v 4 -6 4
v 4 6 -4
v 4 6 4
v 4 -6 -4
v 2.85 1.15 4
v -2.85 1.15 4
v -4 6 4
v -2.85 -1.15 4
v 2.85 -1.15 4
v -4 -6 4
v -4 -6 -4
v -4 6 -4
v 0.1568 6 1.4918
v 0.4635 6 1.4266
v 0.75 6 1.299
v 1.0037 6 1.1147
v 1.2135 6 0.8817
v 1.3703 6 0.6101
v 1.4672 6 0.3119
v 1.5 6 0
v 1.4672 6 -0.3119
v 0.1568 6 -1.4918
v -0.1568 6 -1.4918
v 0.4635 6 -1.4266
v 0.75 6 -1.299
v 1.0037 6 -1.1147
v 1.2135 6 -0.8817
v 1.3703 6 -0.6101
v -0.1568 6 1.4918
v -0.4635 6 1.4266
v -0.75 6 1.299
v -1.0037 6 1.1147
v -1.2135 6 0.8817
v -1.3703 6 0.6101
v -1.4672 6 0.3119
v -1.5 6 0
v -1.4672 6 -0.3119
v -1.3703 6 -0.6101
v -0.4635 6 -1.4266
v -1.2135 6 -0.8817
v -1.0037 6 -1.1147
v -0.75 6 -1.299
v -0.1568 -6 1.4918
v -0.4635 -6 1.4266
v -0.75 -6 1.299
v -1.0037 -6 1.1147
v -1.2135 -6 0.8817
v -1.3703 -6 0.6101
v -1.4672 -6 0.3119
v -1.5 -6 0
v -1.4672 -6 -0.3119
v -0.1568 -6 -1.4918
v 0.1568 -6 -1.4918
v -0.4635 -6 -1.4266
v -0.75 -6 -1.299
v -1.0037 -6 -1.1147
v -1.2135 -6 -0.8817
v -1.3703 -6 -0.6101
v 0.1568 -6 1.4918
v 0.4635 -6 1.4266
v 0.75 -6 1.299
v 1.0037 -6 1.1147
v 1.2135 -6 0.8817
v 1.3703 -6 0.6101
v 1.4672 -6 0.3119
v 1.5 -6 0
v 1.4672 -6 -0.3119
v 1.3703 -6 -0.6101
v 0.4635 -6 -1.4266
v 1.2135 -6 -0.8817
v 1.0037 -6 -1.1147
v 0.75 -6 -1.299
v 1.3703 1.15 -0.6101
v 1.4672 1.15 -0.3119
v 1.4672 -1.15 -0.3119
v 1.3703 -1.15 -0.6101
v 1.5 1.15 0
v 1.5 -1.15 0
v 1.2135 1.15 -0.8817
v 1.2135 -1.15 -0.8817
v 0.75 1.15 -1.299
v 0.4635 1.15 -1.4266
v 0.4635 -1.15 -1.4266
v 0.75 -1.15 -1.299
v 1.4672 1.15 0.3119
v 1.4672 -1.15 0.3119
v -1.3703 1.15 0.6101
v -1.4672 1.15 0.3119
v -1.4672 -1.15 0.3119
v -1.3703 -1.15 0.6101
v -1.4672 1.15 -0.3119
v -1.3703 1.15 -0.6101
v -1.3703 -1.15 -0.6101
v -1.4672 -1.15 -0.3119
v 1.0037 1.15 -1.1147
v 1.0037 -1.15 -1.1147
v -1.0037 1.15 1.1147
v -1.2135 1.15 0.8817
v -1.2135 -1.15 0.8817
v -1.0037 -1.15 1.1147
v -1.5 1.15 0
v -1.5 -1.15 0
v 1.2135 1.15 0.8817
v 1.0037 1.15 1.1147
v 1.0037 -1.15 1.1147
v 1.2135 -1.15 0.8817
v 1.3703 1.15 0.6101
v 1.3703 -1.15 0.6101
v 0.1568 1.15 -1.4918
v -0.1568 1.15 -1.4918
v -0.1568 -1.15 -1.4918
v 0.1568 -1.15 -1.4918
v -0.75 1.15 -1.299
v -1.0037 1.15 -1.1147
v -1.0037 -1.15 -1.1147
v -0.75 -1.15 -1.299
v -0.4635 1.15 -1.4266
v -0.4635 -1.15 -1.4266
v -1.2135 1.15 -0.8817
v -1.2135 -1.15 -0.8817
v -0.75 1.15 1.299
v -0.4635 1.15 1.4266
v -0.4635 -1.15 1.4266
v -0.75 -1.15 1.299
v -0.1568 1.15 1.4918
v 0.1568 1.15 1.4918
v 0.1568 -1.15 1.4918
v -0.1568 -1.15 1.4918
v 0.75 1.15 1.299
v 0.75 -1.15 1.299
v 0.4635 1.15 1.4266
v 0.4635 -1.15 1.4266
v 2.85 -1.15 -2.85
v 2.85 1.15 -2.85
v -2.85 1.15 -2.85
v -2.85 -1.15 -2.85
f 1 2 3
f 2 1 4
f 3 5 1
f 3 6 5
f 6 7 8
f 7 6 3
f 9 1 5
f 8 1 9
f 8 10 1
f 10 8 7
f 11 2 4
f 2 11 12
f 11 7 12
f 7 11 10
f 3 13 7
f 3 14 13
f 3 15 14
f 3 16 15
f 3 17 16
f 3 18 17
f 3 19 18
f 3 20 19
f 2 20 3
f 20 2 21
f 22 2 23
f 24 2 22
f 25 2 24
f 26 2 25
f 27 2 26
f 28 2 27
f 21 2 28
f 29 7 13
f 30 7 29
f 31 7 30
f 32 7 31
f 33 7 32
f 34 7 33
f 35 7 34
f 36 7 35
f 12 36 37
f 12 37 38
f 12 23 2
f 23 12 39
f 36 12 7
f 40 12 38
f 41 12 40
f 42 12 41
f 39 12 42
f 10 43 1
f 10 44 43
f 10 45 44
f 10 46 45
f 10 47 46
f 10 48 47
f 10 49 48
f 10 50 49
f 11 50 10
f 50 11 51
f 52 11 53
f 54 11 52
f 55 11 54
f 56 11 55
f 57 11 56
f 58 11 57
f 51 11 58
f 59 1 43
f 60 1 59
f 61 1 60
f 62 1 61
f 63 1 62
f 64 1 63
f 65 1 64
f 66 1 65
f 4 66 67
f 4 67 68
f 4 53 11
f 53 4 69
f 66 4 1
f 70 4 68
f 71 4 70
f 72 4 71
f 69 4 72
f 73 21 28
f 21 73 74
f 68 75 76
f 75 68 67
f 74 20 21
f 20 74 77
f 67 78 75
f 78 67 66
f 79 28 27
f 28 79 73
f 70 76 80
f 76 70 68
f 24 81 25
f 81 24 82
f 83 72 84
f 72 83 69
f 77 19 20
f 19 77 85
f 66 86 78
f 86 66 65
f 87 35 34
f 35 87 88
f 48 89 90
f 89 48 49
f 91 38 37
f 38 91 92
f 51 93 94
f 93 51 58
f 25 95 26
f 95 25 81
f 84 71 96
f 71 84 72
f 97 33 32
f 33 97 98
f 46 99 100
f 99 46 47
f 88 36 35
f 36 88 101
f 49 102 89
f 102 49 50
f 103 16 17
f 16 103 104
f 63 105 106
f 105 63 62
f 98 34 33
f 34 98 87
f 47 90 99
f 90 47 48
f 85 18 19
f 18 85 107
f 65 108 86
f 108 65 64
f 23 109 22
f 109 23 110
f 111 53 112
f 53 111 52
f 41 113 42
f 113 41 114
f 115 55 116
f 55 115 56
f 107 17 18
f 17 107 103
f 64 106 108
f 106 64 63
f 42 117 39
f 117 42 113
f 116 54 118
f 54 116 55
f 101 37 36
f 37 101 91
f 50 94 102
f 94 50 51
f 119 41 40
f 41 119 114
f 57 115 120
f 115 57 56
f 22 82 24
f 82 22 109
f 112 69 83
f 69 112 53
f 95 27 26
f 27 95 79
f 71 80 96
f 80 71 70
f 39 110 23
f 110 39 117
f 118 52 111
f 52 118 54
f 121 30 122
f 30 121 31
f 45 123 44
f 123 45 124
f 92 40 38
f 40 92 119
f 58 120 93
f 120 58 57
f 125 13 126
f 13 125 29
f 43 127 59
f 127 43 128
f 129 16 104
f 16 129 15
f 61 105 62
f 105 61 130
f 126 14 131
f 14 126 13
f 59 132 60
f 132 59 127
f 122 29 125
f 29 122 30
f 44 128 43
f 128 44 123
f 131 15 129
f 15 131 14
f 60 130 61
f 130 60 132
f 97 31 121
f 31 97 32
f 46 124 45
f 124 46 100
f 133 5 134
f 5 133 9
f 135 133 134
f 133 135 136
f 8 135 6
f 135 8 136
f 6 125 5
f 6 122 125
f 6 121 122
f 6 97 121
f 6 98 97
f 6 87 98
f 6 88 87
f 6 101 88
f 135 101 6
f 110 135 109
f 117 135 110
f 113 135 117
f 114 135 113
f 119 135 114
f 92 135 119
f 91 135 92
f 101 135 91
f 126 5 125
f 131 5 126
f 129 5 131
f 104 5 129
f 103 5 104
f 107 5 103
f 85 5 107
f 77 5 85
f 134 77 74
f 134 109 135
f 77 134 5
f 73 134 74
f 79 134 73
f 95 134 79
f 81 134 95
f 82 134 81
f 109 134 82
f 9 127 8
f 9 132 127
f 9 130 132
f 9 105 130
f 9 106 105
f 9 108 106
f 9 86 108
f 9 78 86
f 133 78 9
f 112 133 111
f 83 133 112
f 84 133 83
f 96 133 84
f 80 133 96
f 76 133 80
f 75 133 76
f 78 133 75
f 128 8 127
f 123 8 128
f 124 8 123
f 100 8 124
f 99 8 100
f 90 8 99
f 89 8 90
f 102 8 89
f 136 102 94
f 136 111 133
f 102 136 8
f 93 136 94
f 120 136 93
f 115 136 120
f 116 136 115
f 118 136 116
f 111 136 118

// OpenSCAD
//powerbank

module roundedcube_simple(size = [1, 1, 1], center = false, radius = 0.5) {
	// If single value, convert to [x, y, z] vector
	size = (size[0] == undef) ? [size, size, size] : size;

	translate = (center == false) ?
		[radius, radius, radius] :
		[
			radius - (size[0] / 2),
			radius - (size[1] / 2),
			radius - (size[2] / 2)
	];

	translate(v = translate)
	minkowski() {
		cube(size = [
			size[0] - (radius * 2),
			size[1] - (radius * 2),
			size[2] - (radius * 2)
		]);
		sphere(r = radius);
	}
}




parede = 2.3;
module luva() {
    difference() {
        
        //roundedcube_simple([15, 80 + parede * 2, 12.1 + parede * 2], true, 5 + parede);
        cube(size=[80 + parede * 2, 15, 12.1 + parede * 2], center=true);
        //roundedcube_simple([156,80,12.1], true, 5);
        cube(size=[80, 156, 12.1], center=true);
        translate([0,0,-5])
        cube(size=[60, 156, 12.1], center=true);
    }
}

module parafusavel() {
    difference() {
    cube(size=[8, 12, 8], center=true);
        $fn = 30;
        rotate([-90,0,0])
        
        cylinder(h=40, r = 1.5, center=true);
    }
}


//porca quadrada
// 5.4, 5.4, 1.8

difference() {
    parafusavel();
    translate([0,0,2])
    cube (size=[5.7, 2.3, 5.7 + 4], center=true);
}
